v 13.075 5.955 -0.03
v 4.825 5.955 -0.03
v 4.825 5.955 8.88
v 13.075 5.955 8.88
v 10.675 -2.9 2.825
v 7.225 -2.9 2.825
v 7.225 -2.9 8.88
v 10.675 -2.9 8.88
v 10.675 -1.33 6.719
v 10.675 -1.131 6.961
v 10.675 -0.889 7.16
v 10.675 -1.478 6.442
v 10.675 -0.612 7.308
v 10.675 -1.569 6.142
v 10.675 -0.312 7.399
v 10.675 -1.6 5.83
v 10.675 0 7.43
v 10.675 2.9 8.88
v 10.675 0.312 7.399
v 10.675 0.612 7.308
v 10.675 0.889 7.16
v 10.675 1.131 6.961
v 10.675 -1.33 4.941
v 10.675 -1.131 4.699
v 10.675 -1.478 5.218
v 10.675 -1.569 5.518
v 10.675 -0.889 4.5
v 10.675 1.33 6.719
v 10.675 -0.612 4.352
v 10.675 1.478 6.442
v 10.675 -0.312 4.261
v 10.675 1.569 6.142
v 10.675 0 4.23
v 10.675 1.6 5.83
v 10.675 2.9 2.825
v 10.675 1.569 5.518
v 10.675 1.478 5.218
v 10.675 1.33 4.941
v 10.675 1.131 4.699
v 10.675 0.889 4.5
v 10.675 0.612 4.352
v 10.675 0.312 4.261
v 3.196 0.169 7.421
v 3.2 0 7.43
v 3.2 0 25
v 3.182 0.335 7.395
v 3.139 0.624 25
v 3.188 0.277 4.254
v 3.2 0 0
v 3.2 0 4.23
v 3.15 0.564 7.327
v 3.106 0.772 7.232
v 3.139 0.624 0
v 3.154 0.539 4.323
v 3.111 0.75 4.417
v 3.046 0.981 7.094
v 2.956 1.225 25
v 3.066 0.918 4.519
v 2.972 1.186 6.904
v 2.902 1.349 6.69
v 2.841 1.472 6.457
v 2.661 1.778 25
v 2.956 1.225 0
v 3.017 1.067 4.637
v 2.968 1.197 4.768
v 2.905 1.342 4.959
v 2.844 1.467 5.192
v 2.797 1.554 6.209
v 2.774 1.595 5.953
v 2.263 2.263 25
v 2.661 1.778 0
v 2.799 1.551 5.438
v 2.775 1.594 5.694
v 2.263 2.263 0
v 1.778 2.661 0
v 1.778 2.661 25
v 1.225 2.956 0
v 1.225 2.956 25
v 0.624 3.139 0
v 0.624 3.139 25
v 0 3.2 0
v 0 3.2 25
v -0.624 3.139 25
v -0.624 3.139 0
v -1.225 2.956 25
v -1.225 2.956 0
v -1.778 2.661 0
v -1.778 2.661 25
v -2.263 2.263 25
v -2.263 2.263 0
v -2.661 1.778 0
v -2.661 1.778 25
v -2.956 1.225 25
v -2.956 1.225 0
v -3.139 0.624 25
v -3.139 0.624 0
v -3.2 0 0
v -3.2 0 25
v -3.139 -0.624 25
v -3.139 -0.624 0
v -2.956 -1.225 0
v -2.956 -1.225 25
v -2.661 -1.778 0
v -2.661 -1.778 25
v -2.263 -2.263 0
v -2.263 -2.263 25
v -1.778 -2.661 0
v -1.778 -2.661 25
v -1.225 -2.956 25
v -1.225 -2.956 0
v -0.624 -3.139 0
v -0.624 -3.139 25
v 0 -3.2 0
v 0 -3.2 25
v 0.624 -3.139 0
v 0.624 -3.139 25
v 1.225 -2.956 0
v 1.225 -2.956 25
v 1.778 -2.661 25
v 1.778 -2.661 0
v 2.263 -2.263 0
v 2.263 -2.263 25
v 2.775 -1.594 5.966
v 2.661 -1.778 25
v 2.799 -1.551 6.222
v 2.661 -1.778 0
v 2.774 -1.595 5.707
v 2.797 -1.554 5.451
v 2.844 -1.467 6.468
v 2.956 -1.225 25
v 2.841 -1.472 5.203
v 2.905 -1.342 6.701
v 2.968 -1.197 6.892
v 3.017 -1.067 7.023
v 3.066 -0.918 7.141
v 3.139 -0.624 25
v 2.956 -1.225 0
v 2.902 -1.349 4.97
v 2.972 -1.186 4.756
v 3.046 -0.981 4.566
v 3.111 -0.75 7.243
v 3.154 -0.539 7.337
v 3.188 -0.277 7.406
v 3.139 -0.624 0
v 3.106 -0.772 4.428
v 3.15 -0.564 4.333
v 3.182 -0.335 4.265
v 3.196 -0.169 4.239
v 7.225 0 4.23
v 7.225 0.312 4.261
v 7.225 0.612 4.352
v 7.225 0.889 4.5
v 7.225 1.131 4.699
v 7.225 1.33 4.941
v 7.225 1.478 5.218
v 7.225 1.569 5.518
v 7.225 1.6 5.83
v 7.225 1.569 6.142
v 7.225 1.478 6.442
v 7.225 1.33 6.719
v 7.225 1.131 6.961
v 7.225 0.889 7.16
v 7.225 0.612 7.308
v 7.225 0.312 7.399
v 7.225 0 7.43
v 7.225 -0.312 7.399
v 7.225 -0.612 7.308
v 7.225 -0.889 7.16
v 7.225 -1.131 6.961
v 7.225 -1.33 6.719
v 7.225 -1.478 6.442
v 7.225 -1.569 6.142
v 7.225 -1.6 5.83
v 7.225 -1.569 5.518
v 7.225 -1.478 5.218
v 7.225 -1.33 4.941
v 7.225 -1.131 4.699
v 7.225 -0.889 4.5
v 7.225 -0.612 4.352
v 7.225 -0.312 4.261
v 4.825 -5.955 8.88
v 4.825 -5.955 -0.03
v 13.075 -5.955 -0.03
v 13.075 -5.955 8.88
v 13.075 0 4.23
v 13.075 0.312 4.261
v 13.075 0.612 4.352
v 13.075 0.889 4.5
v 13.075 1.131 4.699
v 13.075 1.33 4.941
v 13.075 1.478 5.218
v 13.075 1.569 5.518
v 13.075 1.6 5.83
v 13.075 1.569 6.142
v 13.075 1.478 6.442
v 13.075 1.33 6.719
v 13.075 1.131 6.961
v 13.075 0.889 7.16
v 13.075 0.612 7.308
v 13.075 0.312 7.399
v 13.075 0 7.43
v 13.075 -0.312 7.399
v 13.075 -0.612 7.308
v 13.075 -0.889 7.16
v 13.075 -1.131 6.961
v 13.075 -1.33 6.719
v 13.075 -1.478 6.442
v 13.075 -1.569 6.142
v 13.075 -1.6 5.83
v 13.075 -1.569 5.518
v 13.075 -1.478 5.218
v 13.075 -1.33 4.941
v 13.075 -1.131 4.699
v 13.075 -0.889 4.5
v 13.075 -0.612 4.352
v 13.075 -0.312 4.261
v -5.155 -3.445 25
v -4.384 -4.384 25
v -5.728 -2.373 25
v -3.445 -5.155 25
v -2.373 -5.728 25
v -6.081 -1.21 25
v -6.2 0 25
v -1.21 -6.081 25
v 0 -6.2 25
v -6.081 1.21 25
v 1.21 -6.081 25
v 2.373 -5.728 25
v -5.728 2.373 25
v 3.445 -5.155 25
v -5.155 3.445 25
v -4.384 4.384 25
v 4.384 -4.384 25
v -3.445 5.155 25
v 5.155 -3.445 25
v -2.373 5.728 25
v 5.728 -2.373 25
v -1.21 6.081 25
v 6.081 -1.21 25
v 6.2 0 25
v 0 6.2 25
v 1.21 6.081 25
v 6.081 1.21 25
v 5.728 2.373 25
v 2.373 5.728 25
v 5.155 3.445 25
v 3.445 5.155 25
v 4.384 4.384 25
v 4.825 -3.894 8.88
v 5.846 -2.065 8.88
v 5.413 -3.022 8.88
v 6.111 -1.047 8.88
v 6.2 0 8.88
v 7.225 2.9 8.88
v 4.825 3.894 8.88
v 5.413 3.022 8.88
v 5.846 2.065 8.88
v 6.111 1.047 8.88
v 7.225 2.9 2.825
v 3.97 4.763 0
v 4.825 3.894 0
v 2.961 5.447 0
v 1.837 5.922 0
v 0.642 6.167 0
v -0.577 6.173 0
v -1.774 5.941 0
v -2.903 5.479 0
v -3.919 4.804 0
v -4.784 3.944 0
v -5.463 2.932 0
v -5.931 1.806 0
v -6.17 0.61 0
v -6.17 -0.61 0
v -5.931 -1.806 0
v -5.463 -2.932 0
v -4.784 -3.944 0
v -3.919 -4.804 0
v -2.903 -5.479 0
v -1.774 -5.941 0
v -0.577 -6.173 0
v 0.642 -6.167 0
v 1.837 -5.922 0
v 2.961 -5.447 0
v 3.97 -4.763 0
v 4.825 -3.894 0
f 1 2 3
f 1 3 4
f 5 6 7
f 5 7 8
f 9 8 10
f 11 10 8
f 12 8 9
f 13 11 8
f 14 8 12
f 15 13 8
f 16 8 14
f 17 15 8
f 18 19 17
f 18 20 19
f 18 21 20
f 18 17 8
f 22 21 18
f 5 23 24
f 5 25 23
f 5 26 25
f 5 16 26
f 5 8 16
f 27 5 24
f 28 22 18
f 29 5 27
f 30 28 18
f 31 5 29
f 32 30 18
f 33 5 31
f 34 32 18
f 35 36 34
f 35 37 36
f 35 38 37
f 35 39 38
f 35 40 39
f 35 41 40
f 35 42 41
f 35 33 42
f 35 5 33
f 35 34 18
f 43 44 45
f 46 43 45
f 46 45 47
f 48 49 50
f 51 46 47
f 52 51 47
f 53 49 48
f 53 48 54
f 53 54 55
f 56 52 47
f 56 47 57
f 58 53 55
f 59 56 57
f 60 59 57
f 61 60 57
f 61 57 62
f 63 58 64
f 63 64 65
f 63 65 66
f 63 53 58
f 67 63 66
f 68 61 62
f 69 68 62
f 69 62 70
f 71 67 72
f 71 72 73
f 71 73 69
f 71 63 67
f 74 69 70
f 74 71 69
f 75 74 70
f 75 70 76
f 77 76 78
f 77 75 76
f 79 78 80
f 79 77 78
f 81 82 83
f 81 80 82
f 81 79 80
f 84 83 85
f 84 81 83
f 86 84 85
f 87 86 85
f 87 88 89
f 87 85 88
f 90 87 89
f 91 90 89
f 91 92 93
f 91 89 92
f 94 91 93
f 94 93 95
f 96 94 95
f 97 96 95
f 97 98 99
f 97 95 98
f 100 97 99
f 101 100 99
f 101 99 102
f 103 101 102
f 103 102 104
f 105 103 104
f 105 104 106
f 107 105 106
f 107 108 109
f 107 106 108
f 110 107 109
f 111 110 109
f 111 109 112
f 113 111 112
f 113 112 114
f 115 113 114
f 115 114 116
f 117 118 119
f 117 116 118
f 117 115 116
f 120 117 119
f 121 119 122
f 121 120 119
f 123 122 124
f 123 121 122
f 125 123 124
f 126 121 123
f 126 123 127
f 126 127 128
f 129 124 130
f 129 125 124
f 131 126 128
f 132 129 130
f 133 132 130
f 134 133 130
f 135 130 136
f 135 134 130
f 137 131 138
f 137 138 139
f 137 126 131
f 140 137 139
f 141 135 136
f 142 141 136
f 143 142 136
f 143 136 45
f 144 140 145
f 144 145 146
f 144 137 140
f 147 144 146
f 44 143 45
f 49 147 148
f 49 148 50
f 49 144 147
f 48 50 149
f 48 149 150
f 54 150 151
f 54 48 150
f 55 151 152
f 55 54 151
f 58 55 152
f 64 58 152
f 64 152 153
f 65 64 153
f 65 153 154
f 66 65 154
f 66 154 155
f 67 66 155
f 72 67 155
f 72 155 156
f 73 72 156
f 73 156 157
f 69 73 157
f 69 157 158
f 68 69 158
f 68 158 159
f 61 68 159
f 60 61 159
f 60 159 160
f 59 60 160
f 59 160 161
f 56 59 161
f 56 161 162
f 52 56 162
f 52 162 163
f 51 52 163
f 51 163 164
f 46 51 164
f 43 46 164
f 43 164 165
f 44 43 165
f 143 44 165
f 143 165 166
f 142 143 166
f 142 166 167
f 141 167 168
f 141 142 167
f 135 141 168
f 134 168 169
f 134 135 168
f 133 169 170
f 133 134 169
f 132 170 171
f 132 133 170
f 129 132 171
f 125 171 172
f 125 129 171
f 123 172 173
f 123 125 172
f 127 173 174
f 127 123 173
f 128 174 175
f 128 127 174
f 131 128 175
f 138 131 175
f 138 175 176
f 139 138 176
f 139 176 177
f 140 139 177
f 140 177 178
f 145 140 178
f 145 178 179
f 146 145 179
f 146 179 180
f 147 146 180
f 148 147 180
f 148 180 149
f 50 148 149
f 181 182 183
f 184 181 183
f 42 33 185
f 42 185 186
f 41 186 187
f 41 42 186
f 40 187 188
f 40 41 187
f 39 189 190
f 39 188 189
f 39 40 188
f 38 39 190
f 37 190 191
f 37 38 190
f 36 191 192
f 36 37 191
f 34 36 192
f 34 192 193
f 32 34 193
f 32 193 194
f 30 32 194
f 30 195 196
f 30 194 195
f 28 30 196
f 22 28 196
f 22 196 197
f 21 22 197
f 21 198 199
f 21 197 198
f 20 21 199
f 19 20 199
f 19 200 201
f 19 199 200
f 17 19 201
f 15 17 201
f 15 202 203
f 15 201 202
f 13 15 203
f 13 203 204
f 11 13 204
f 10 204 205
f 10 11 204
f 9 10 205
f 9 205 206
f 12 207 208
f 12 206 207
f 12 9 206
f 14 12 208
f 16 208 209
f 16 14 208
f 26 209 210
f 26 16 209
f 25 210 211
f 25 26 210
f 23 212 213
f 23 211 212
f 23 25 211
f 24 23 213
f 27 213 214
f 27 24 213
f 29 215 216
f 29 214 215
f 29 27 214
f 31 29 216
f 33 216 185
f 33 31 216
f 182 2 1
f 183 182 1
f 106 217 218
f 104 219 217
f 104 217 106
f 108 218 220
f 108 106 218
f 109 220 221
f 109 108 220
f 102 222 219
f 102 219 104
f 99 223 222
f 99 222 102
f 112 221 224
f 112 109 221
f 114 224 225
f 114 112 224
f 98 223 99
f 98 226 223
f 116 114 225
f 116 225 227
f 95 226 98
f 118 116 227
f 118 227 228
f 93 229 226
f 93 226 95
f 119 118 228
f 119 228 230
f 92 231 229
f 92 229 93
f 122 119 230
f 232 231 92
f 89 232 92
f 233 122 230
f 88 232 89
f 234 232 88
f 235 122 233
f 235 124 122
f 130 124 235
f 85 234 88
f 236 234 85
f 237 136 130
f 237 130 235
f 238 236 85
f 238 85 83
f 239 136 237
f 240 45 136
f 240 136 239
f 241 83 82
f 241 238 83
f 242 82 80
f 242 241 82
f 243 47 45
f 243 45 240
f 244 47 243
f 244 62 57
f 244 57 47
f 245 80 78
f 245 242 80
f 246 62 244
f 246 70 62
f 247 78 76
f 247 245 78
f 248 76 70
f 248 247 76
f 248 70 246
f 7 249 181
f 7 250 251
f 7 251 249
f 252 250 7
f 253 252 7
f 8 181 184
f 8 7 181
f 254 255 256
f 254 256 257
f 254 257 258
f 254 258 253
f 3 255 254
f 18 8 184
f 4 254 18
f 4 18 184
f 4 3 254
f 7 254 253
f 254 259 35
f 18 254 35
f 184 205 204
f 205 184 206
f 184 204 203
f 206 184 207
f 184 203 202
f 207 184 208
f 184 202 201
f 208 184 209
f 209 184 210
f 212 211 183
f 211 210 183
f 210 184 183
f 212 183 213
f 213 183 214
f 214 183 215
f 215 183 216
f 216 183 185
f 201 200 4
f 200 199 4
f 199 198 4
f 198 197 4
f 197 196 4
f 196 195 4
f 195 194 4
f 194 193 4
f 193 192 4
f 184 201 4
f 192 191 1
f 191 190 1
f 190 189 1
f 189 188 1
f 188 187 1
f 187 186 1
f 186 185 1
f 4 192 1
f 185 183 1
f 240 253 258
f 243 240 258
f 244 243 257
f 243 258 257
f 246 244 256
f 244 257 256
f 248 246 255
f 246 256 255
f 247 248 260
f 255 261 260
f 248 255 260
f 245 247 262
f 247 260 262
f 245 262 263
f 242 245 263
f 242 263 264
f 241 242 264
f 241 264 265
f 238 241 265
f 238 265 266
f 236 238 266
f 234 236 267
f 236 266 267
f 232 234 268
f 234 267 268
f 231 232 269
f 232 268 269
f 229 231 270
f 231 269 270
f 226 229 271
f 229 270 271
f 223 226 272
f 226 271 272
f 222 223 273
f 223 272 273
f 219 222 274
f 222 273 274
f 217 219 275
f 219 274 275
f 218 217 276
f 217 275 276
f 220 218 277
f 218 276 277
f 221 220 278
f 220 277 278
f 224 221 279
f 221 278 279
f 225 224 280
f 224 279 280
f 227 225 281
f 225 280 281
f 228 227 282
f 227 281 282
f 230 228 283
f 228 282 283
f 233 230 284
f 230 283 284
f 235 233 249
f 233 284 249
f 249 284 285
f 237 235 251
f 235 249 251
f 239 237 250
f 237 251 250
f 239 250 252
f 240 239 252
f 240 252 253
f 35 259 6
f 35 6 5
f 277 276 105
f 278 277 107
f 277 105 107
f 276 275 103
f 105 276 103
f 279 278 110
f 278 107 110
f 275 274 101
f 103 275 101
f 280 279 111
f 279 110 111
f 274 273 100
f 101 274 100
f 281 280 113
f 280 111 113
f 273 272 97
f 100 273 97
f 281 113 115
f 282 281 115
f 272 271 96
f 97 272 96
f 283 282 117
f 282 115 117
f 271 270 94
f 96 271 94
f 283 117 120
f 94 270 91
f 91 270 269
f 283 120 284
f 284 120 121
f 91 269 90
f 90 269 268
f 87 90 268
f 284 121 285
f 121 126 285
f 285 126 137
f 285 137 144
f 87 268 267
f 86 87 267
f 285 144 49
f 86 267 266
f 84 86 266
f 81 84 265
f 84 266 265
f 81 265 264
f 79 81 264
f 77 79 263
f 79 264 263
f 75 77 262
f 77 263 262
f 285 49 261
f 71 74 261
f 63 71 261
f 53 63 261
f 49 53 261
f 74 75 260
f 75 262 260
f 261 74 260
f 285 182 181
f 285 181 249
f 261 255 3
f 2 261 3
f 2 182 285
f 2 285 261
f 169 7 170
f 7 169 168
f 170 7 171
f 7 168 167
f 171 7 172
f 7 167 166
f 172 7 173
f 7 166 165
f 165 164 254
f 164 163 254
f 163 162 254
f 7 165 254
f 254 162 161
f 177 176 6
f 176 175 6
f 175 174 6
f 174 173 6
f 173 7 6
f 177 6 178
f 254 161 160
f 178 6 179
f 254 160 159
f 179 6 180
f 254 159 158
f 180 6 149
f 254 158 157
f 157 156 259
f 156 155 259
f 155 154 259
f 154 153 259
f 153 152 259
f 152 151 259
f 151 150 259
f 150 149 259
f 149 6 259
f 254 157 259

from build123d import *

# Parameters (mm, degrees)
CYLINDER005_R     = 1.6
CYLINDER005_DEPTH = 22.9
CYLINDER003_R     = 3.2
CYLINDER003_DEPTH = 50
CUBE003_W         = 3.45
CUBE003_H         = 5.8
CUBE003_DEPTH     = 11.11
CUBE002_W         = 8.25
CUBE002_H         = 11.91
CUBE002_DEPTH     = 8.91
CYLINDER004_R     = 6.2
CYLINDER004_DEPTH = 25


with BuildPart() as cylinder005:
    # cylinder005 → cylinder005 (new body)
    with BuildSketch(Plane(origin=(0, 0, 5.83), x_dir=(0, 0, -1), z_dir=(1, 0, 0))):
        Circle(CYLINDER005_R)
    extrude(amount=CYLINDER005_DEPTH)


with BuildPart() as union002:
    # cylinder003 → cylinder003 (new body)
    with BuildSketch(Plane.XY.offset(-1)):
        Circle(CYLINDER003_R)
    extrude(amount=CYLINDER003_DEPTH)

    # union002: union cylinder005
    add(cylinder005.part)


with BuildPart() as cube003:
    # cube003 → cube003 (new body)
    with BuildSketch(Plane(origin=(-1.725, -2.9, -3.6), x_dir=(1, 0, 0), z_dir=(0, 0, 1))):
        with Locations((1.725, 2.9)):
            Rectangle(CUBE003_W, CUBE003_H)
    extrude(amount=CUBE003_DEPTH)


with BuildPart() as difference002:
    # cube002 → cube002 (new body)
    with BuildSketch(Plane(origin=(-4.125, -5.955, -6.455), x_dir=(1, 0, 0), z_dir=(0, 0, 1))):
        with Locations((4.125, 5.955)):
            Rectangle(CUBE002_W, CUBE002_H)
    extrude(amount=CUBE002_DEPTH)

    # difference002: cut cube003
    add(cube003.part, mode=Mode.SUBTRACT)


with BuildPart() as difference002_1:
    # difference002 placement: moved
    add(difference002.part.moved(Location((8.95, 0, 6.425))))


with BuildPart() as wheel_fit_holder:
    # cylinder004 → cylinder004 (new body)
    with BuildSketch(Plane.XY):
        Circle(CYLINDER004_R)
    extrude(amount=CYLINDER004_DEPTH)

    # union003: union difference002
    add(difference002_1.part)

    # difference003: cut union002
    add(union002.part, mode=Mode.SUBTRACT)


solid = wheel_fit_holder.part
